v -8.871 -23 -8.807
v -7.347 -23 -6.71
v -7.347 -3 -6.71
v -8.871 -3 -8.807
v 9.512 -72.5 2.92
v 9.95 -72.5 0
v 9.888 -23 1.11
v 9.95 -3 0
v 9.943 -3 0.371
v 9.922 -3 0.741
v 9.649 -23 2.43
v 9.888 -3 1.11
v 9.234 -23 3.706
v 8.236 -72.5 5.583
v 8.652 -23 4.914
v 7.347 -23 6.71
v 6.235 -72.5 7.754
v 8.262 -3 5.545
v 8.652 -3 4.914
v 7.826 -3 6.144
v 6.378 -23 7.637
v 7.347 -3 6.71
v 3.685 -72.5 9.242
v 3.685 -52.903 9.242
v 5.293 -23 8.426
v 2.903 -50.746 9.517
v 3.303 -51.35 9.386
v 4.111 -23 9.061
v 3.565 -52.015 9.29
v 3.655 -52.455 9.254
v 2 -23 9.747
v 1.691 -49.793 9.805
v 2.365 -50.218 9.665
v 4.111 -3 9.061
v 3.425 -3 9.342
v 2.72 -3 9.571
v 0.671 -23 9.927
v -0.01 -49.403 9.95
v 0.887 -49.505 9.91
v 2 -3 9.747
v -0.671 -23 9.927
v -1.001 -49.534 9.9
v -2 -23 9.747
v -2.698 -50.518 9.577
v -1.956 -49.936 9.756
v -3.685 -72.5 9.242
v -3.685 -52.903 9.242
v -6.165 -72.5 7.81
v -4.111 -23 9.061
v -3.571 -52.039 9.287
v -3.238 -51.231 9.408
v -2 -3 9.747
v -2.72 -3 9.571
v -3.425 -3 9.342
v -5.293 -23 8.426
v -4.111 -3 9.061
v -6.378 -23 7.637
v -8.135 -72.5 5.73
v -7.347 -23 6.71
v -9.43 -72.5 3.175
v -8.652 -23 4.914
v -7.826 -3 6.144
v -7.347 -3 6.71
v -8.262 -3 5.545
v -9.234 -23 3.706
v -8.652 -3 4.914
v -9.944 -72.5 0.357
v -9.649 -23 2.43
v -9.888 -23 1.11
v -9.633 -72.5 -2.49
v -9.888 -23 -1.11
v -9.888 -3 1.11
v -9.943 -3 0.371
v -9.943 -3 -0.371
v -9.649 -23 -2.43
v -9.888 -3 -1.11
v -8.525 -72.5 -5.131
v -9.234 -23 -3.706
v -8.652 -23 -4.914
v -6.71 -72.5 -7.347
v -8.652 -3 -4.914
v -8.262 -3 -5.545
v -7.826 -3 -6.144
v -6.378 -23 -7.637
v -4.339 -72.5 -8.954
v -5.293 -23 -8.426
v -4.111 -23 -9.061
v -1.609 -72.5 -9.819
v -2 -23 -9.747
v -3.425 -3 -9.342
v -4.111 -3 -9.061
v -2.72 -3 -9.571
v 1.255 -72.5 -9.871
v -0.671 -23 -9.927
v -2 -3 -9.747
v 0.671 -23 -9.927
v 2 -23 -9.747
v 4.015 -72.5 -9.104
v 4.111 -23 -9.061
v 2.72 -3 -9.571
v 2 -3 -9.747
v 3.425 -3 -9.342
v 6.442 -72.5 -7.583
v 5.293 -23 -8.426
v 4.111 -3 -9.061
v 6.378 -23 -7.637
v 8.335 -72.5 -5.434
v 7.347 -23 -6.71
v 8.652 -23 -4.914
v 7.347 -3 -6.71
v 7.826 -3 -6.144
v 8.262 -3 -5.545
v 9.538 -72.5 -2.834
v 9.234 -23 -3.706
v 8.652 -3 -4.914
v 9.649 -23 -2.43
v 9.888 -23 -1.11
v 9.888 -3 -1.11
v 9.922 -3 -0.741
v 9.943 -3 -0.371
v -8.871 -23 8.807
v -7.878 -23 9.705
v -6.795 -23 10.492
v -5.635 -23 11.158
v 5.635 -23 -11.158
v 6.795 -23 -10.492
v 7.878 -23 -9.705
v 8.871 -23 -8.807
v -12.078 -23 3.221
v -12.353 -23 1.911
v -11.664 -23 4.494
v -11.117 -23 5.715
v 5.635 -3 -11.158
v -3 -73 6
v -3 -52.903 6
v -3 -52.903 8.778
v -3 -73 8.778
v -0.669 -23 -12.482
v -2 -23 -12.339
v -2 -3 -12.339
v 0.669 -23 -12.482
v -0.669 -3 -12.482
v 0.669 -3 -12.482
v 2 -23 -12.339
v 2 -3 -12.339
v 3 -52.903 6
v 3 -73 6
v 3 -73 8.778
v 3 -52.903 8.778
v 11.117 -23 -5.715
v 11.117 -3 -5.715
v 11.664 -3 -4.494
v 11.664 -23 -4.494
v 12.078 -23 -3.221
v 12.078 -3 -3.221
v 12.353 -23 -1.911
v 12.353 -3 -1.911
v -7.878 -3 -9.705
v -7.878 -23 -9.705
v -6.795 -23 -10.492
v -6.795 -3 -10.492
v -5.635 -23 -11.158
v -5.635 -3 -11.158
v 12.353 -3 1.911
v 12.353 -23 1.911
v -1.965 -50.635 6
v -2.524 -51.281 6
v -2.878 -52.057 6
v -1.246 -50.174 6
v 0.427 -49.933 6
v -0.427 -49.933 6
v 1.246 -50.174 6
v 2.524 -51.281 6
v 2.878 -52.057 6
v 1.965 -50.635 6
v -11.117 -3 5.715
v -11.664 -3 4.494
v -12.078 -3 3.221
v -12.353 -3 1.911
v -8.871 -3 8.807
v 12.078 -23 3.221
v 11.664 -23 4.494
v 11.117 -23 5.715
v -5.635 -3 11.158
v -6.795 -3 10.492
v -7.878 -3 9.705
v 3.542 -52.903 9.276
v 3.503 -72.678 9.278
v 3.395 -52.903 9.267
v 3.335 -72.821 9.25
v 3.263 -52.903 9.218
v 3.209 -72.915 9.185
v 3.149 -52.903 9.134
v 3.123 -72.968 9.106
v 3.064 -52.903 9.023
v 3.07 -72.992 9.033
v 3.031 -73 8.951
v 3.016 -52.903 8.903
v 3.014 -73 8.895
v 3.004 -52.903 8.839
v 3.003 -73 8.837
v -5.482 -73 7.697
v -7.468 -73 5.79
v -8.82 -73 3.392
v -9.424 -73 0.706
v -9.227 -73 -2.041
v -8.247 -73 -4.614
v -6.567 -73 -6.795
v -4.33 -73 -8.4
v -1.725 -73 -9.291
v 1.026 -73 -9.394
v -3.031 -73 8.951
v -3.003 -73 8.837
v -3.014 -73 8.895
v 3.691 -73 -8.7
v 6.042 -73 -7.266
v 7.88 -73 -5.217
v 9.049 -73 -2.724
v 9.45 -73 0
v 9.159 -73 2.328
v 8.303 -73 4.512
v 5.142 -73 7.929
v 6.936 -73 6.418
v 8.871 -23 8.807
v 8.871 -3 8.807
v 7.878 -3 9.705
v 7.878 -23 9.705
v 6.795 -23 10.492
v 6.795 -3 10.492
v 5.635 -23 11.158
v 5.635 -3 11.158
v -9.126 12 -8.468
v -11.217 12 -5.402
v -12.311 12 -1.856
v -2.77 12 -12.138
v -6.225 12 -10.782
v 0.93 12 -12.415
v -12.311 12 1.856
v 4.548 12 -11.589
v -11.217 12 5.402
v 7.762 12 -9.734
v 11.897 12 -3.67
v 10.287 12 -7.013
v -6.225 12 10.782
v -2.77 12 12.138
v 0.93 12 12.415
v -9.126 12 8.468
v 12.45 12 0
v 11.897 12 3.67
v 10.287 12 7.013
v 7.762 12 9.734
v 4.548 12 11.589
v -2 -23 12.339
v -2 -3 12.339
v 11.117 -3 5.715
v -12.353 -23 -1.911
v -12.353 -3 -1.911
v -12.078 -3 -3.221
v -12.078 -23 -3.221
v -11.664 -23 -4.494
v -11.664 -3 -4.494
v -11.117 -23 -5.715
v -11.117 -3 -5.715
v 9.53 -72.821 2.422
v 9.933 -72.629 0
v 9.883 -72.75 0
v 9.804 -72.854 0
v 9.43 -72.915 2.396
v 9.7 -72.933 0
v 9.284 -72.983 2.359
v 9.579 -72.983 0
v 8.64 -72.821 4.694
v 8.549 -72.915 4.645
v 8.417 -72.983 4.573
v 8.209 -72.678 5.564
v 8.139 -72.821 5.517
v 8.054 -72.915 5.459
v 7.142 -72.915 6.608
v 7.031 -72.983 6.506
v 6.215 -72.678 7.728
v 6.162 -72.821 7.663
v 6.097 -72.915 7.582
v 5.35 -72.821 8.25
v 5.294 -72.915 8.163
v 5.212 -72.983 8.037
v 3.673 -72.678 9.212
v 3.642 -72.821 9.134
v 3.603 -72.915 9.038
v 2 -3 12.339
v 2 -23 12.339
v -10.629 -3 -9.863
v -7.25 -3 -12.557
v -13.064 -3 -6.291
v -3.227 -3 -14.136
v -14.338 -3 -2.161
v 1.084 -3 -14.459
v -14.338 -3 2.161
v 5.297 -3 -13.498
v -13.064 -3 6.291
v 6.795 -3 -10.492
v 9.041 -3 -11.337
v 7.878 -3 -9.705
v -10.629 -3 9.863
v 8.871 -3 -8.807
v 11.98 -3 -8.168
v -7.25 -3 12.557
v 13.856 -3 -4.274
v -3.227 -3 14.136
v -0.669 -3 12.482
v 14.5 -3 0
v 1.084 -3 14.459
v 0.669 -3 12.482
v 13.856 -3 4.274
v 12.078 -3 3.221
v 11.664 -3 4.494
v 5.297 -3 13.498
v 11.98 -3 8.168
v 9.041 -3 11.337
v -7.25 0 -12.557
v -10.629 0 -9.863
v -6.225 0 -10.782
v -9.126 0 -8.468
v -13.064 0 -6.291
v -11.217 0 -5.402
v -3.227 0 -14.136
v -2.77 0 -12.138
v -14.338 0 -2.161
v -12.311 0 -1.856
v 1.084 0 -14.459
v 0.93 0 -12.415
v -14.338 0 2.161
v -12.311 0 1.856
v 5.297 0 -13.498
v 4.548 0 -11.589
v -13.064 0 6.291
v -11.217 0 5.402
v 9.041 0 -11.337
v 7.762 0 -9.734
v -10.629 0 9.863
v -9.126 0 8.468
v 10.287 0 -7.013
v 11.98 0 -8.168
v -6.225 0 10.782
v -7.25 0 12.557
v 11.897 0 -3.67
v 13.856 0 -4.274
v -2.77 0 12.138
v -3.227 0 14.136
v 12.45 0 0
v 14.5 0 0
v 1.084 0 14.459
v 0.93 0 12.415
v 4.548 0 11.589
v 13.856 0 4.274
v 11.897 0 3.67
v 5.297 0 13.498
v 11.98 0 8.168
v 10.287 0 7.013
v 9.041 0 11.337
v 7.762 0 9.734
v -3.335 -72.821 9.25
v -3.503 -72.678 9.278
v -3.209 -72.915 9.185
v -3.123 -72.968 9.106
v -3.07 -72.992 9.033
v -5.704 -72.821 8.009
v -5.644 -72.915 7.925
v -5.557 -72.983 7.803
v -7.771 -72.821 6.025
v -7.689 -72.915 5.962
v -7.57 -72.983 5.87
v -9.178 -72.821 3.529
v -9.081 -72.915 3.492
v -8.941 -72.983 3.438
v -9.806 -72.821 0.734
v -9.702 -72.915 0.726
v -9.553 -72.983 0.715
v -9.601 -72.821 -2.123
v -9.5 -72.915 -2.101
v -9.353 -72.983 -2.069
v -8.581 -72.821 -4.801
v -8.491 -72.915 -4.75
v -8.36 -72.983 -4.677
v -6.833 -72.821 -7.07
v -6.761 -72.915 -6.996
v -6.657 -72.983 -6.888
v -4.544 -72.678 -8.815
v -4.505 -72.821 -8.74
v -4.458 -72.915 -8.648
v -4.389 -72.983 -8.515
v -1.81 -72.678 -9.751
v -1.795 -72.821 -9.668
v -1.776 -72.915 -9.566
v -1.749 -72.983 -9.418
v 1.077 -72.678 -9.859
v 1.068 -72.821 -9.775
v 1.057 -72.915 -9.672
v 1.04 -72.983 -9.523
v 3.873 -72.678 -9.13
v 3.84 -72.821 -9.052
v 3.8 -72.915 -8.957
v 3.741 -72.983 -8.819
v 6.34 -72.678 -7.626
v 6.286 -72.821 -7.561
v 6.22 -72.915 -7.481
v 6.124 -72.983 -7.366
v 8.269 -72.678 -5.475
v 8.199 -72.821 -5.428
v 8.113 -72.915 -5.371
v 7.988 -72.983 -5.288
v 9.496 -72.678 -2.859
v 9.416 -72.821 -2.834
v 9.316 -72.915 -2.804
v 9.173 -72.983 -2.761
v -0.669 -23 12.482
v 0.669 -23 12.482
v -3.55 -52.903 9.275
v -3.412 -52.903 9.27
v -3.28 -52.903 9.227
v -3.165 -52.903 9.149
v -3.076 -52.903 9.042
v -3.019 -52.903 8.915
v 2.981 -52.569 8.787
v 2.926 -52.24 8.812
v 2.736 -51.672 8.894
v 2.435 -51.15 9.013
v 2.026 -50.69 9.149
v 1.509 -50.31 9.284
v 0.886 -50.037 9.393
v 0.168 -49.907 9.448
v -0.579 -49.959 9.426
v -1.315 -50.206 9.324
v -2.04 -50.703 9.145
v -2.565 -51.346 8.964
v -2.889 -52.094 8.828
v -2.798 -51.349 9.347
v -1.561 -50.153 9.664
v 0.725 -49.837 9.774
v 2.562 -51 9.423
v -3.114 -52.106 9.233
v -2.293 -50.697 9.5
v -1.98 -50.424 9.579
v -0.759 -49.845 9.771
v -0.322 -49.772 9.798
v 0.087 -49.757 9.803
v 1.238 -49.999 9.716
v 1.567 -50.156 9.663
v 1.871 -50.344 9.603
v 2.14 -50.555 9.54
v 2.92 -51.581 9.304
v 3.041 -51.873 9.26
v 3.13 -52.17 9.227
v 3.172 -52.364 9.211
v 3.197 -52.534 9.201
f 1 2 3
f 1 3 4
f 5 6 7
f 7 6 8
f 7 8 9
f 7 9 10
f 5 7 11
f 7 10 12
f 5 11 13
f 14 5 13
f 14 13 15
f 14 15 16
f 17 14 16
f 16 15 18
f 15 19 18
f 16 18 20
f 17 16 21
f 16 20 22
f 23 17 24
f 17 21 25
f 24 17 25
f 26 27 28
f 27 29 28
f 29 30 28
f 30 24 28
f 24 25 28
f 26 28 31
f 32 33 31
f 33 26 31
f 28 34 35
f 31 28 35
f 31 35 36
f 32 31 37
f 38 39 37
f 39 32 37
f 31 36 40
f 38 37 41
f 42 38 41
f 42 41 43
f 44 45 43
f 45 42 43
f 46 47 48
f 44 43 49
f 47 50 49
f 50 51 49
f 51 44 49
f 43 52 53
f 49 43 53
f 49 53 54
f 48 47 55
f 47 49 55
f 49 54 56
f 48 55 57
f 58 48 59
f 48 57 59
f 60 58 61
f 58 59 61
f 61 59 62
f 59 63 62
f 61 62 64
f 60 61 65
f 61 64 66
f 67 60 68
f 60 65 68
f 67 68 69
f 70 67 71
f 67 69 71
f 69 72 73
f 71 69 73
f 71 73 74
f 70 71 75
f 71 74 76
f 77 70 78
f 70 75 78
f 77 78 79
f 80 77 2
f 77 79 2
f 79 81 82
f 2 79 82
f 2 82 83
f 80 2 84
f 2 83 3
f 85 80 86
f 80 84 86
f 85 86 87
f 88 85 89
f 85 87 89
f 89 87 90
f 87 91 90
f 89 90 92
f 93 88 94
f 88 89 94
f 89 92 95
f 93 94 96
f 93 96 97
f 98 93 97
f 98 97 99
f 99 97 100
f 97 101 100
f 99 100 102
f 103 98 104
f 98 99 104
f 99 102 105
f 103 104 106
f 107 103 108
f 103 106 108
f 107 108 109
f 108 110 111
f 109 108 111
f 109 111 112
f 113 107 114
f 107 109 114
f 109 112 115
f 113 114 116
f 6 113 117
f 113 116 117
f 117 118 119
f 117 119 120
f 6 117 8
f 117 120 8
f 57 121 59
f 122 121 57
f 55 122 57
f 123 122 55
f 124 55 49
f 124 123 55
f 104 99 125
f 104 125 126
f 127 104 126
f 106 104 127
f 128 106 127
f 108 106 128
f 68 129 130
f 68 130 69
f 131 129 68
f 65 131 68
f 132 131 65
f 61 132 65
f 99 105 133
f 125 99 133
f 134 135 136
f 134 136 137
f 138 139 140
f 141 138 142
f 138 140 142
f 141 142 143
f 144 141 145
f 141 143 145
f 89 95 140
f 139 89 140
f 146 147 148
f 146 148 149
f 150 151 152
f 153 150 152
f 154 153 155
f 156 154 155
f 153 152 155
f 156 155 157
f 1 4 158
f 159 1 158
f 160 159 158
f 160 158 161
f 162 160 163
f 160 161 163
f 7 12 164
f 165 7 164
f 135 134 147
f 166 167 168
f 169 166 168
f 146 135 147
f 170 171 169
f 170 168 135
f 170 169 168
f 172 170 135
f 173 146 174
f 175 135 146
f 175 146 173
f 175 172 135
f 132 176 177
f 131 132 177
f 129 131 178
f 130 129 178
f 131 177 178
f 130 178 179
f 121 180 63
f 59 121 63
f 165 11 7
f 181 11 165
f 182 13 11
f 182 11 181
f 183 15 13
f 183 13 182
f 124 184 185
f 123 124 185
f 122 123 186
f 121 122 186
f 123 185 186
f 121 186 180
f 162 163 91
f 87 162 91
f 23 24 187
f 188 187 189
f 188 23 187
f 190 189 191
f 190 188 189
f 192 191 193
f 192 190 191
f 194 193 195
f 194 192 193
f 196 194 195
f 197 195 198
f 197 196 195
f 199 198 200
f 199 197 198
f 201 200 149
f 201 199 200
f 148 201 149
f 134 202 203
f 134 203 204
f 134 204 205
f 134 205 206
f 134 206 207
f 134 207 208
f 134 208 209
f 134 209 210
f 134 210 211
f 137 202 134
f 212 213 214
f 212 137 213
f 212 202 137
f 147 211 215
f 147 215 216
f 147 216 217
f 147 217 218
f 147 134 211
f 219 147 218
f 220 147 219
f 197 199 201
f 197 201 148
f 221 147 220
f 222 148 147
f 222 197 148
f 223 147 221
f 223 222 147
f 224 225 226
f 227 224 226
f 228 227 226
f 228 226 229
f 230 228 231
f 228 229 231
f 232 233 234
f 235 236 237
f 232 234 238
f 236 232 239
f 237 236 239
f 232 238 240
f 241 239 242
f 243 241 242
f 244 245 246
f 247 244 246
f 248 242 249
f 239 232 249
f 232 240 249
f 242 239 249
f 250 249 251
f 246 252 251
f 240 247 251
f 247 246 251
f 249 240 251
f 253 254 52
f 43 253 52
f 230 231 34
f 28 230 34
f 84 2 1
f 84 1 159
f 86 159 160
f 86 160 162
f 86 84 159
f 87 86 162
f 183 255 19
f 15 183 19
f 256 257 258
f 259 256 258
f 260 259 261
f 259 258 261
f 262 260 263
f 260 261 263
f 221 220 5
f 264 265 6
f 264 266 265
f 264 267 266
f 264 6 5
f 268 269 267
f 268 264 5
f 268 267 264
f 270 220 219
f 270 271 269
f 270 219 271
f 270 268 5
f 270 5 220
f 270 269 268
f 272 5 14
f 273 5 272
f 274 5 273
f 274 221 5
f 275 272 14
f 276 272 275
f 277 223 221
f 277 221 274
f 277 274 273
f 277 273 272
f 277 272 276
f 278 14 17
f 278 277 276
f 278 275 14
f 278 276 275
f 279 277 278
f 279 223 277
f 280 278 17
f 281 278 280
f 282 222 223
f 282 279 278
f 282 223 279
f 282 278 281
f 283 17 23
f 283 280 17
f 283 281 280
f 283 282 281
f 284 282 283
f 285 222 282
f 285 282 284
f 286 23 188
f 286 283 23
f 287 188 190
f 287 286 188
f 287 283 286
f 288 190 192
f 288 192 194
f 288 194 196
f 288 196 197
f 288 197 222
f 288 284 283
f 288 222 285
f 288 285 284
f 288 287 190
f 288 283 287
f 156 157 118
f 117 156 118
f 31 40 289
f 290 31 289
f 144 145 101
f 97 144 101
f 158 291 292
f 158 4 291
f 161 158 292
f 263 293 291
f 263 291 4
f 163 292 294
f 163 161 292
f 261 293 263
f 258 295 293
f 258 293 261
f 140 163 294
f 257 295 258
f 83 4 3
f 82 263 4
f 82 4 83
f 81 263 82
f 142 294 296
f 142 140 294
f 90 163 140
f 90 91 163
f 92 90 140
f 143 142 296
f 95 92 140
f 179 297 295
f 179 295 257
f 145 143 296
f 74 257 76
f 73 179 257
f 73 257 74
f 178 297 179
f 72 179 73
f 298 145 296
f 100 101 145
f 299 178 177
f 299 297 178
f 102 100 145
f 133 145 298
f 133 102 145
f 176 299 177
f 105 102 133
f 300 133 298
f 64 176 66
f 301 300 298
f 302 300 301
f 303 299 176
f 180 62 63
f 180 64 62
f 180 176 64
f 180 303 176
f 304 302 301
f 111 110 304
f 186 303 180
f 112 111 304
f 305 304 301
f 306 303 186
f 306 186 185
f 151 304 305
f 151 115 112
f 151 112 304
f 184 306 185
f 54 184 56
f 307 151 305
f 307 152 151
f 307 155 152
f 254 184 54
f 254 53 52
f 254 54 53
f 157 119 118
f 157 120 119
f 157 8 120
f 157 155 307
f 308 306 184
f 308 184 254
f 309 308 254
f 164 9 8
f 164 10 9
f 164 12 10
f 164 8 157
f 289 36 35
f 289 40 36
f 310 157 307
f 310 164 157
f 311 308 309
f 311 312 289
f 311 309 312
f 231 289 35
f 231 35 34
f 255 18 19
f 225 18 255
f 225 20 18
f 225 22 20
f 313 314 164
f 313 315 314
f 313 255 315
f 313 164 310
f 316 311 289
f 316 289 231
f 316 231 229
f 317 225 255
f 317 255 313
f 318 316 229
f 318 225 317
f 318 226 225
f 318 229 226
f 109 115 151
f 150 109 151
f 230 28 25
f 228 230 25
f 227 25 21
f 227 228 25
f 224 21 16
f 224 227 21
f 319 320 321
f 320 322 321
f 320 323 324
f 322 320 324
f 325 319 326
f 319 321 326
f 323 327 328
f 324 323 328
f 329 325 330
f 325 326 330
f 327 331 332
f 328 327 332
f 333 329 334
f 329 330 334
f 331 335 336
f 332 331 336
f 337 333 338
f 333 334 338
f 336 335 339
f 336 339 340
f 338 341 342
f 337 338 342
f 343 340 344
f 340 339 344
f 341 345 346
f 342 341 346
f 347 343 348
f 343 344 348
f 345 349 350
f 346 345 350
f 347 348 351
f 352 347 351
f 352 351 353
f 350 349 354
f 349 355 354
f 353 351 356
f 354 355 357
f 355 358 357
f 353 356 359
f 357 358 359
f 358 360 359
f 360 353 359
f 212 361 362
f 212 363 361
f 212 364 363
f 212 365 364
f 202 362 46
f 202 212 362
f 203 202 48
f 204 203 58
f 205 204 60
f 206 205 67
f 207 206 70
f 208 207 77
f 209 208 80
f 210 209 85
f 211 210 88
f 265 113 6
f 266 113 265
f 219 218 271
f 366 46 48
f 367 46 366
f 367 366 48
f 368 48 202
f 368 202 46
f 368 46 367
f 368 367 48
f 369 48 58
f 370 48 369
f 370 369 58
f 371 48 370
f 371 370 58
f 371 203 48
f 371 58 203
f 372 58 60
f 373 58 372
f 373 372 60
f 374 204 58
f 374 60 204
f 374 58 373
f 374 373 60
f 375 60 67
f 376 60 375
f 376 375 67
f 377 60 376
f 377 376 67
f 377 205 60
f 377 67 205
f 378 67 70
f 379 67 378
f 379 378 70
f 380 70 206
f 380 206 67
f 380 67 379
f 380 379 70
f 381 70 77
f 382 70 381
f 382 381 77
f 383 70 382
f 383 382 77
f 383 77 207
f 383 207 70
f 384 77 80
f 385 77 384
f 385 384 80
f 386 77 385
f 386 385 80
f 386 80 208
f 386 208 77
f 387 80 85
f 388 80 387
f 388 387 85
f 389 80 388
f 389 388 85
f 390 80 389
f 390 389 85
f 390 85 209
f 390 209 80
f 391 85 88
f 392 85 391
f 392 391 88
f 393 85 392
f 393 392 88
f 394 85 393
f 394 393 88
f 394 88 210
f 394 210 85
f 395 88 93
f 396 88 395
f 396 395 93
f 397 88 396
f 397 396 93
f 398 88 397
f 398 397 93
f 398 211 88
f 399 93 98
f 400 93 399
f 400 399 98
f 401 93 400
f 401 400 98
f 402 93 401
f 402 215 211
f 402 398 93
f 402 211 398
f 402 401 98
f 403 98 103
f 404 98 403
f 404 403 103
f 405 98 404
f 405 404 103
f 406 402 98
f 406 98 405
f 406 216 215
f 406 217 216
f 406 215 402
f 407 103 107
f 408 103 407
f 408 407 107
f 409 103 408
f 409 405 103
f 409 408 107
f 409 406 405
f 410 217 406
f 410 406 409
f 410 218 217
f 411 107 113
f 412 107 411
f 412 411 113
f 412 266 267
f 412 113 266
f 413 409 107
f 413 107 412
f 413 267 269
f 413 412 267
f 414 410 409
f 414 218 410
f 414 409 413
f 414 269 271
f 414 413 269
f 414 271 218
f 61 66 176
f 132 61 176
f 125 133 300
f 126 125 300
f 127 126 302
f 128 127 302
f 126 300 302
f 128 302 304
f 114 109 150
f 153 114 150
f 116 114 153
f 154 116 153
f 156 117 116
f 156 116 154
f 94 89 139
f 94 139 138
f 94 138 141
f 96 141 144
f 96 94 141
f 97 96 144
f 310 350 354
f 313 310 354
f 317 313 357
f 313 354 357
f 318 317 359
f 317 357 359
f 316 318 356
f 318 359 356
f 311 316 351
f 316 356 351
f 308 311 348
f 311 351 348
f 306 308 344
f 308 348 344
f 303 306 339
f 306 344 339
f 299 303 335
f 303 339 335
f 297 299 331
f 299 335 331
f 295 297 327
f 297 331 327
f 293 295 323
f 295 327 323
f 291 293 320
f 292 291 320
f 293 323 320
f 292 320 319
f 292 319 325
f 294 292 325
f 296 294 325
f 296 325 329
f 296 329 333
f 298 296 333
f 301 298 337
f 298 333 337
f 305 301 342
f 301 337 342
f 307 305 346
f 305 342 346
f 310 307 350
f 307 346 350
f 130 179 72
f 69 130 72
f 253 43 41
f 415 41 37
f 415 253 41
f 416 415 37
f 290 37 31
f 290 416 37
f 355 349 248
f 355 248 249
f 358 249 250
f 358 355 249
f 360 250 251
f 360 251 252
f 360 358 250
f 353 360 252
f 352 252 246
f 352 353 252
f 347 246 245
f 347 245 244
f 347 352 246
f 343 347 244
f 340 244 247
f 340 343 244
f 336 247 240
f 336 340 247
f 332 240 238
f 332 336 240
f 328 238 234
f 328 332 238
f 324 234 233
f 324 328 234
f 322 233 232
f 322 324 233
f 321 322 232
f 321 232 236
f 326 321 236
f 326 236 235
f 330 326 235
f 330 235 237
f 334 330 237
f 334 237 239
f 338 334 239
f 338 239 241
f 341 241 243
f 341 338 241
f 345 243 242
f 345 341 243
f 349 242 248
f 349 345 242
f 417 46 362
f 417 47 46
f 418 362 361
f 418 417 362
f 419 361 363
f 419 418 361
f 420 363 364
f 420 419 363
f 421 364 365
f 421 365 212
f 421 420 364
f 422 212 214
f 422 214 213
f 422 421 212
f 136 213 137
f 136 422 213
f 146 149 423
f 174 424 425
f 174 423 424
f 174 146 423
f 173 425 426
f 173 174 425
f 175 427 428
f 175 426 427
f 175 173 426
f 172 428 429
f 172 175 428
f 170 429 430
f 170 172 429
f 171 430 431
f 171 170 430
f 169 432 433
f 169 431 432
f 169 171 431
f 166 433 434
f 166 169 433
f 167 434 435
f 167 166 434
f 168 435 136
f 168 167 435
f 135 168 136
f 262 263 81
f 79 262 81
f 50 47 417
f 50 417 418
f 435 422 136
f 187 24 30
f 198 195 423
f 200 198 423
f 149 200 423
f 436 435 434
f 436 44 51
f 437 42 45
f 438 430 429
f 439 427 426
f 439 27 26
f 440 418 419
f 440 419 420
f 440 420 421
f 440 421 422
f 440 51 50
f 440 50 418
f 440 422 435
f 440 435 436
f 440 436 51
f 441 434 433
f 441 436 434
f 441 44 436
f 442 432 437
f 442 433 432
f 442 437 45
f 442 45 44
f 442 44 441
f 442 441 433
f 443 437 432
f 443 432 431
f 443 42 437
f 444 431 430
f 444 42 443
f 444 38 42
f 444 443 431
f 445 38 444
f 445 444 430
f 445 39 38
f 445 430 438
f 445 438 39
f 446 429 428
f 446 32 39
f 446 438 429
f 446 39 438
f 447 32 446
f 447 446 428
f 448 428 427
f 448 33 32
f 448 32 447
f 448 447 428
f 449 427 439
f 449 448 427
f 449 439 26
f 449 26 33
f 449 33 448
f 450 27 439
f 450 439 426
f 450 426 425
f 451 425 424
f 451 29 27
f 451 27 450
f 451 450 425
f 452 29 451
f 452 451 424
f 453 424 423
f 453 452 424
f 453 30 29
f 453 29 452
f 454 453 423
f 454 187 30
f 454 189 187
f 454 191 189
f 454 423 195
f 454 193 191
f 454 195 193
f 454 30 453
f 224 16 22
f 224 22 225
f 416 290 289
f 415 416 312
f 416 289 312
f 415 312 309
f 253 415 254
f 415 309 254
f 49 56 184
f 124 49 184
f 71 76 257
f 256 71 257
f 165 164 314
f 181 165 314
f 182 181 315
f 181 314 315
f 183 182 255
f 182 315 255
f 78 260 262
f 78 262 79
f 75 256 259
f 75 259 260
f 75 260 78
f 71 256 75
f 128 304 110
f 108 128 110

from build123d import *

# Parameters (mm, degrees)
F0_R      = 12.45
F1_DEPTH  = 12
F2_R      = 14.5
F3_DEPTH  = 3
F4_R      = 9.95
F5_DEPTH  = 70
F7_DEPTH  = 20
F10_DEPTH = 23.8
F11_R     = 0.5


with BuildPart() as f1:
    # F0 (on Front) → F1 (new body)
    with BuildSketch(Plane.XZ):
        Circle(F0_R)
    extrude(amount=-F1_DEPTH)

    # F2 (on Front) → F3 (join)
    with BuildSketch(Plane.XZ):
        Circle(F2_R)
    extrude(amount=F3_DEPTH)

    # F4 (on face) → F5 (join)
    with BuildSketch(Plane.XZ.offset(3)):
        Circle(F4_R)
    extrude(amount=F5_DEPTH)

    # F6 (on face) → F7 (join)
    with BuildSketch(Plane.XZ.offset(3)):
        with BuildLine():
            Line((2, 9.7469225913), (2, 12.3389626793))
            ThreePointArc((2, 12.3389626793), (0, 12.5), (-2, 12.3389626793))
            Line((-2, 12.3389626793), (-2, 9.7469225913))
            ThreePointArc((-2, 9.7469225913), (0, 9.95), (2, 9.7469225913))
        make_face()
        with BuildLine():
            ThreePointArc((-7.3471313431, 6.7098555146), (-5.8484632603, 8.049719094), (-4.1110633656, 9.0609965238))
            Line((-4.1110633656, 9.0609965238), (-5.6346263027, 11.1580010051))
            ThreePointArc((-5.6346263027, 11.1580010051), (-7.3473156537, 10.1127124297), (-8.8706942802, 8.8068599959))
            Line((-8.8706942802, 8.8068599959), (-7.3471313431, 6.7098555146))
        make_face()
        with BuildLine():
            ThreePointArc((-9.887908233, 1.109851691), (-9.4630123371, 3.074719094), (-8.6518402555, 4.9140777561))
            Line((-8.6518402555, 4.9140777561), (-11.1170168717, 5.7150621934))
            ThreePointArc((-11.1170168717, 5.7150621934), (-11.8882064537, 3.8627124297), (-12.3530848492, 1.9108361283))
            Line((-12.3530848492, 1.9108361283), (-9.887908233, 1.109851691))
        make_face()
        with BuildLine():
            ThreePointArc((-8.6518402555, -4.9140777561), (-9.4630123371, -3.074719094), (-9.887908233, -1.109851691))
            Line((-9.887908233, -1.109851691), (-12.3530848492, -1.9108361283))
            ThreePointArc((-12.3530848492, -1.9108361283), (-11.8882064537, -3.8627124297), (-11.1170168717, -5.7150621934))
            Line((-11.1170168717, -5.7150621934), (-8.6518402555, -4.9140777561))
        make_face()
        with BuildLine():
            ThreePointArc((-4.1110633656, -9.0609965238), (-5.8484632603, -8.049719094), (-7.3471313431, -6.7098555146))
            Line((-7.3471313431, -6.7098555146), (-8.8706942802, -8.8068599959))
            ThreePointArc((-8.8706942802, -8.8068599959), (-7.3473156537, -10.1127124297), (-5.6346263027, -11.1580010051))
            Line((-5.6346263027, -11.1580010051), (-4.1110633656, -9.0609965238))
        make_face()
        with BuildLine():
            ThreePointArc((2, -9.7469225913), (0, -9.95), (-2, -9.7469225913))
            Line((-2, -9.7469225913), (-2, -12.3389626793))
            ThreePointArc((-2, -12.3389626793), (0, -12.5), (2, -12.3389626793))
            Line((2, -12.3389626793), (2, -9.7469225913))
        make_face()
        with BuildLine():
            Line((8.8706942802, -8.8068599959), (7.3471313431, -6.7098555146))
            ThreePointArc((7.3471313431, -6.7098555146), (5.8484632603, -8.049719094), (4.1110633656, -9.0609965238))
            Line((4.1110633656, -9.0609965238), (5.6346263027, -11.1580010051))
            ThreePointArc((5.6346263027, -11.1580010051), (7.3473156537, -10.1127124297), (8.8706942802, -8.8068599959))
        make_face()
        with BuildLine():
            Line((12.3530848492, -1.9108361283), (9.887908233, -1.109851691))
            ThreePointArc((9.887908233, -1.109851691), (9.4630123371, -3.074719094), (8.6518402555, -4.9140777561))
            Line((8.6518402555, -4.9140777561), (11.1170168717, -5.7150621934))
            ThreePointArc((11.1170168717, -5.7150621934), (11.8882064537, -3.8627124297), (12.3530848492, -1.9108361283))
        make_face()
        with BuildLine():
            Line((11.1170168717, 5.7150621934), (8.6518402555, 4.9140777561))
            ThreePointArc((8.6518402555, 4.9140777561), (9.4630123371, 3.074719094), (9.887908233, 1.109851691))
            Line((9.887908233, 1.109851691), (12.3530848492, 1.9108361283))
            ThreePointArc((12.3530848492, 1.9108361283), (11.8882064537, 3.8627124297), (11.1170168717, 5.7150621934))
        make_face()
        with BuildLine():
            Line((5.6346263027, 11.1580010051), (4.1110633656, 9.0609965238))
            ThreePointArc((4.1110633656, 9.0609965238), (5.8484632603, 8.049719094), (7.3471313431, 6.7098555146))
            Line((7.3471313431, 6.7098555146), (8.8706942802, 8.8068599959))
            ThreePointArc((8.8706942802, 8.8068599959), (7.3473156537, 10.1127124297), (5.6346263027, 11.1580010051))
        make_face()
    extrude(amount=F7_DEPTH)

    # F9 (on offset) → F10 (cut)
    with BuildSketch(Plane.XY.offset(6)):
        with BuildLine():
            Line((-3, -52.9026644758), (-3, -80.1426661679))
            Line((-3, -80.1426661679), (3, -80.1426661679))
            Line((3, -80.1426661679), (3, -52.9026644758))
            ThreePointArc((3, -52.9026644758), (0, -49.9026644758), (-3, -52.9026644758))
        make_face()
    extrude(amount=F10_DEPTH, mode=Mode.SUBTRACT)

    # F11
    f11_edges = [f1.edges().sort_by_distance(p)[0] for p in [
        (-3, -62.951332, 9.486965),
        (0, -49.902664, 9.95),
        (3, -62.951332, 9.486965),
        (-5.880157, -73, -8.026596),
    ]]
    fillet(f11_edges, radius=F11_R)


solid = f1.part
